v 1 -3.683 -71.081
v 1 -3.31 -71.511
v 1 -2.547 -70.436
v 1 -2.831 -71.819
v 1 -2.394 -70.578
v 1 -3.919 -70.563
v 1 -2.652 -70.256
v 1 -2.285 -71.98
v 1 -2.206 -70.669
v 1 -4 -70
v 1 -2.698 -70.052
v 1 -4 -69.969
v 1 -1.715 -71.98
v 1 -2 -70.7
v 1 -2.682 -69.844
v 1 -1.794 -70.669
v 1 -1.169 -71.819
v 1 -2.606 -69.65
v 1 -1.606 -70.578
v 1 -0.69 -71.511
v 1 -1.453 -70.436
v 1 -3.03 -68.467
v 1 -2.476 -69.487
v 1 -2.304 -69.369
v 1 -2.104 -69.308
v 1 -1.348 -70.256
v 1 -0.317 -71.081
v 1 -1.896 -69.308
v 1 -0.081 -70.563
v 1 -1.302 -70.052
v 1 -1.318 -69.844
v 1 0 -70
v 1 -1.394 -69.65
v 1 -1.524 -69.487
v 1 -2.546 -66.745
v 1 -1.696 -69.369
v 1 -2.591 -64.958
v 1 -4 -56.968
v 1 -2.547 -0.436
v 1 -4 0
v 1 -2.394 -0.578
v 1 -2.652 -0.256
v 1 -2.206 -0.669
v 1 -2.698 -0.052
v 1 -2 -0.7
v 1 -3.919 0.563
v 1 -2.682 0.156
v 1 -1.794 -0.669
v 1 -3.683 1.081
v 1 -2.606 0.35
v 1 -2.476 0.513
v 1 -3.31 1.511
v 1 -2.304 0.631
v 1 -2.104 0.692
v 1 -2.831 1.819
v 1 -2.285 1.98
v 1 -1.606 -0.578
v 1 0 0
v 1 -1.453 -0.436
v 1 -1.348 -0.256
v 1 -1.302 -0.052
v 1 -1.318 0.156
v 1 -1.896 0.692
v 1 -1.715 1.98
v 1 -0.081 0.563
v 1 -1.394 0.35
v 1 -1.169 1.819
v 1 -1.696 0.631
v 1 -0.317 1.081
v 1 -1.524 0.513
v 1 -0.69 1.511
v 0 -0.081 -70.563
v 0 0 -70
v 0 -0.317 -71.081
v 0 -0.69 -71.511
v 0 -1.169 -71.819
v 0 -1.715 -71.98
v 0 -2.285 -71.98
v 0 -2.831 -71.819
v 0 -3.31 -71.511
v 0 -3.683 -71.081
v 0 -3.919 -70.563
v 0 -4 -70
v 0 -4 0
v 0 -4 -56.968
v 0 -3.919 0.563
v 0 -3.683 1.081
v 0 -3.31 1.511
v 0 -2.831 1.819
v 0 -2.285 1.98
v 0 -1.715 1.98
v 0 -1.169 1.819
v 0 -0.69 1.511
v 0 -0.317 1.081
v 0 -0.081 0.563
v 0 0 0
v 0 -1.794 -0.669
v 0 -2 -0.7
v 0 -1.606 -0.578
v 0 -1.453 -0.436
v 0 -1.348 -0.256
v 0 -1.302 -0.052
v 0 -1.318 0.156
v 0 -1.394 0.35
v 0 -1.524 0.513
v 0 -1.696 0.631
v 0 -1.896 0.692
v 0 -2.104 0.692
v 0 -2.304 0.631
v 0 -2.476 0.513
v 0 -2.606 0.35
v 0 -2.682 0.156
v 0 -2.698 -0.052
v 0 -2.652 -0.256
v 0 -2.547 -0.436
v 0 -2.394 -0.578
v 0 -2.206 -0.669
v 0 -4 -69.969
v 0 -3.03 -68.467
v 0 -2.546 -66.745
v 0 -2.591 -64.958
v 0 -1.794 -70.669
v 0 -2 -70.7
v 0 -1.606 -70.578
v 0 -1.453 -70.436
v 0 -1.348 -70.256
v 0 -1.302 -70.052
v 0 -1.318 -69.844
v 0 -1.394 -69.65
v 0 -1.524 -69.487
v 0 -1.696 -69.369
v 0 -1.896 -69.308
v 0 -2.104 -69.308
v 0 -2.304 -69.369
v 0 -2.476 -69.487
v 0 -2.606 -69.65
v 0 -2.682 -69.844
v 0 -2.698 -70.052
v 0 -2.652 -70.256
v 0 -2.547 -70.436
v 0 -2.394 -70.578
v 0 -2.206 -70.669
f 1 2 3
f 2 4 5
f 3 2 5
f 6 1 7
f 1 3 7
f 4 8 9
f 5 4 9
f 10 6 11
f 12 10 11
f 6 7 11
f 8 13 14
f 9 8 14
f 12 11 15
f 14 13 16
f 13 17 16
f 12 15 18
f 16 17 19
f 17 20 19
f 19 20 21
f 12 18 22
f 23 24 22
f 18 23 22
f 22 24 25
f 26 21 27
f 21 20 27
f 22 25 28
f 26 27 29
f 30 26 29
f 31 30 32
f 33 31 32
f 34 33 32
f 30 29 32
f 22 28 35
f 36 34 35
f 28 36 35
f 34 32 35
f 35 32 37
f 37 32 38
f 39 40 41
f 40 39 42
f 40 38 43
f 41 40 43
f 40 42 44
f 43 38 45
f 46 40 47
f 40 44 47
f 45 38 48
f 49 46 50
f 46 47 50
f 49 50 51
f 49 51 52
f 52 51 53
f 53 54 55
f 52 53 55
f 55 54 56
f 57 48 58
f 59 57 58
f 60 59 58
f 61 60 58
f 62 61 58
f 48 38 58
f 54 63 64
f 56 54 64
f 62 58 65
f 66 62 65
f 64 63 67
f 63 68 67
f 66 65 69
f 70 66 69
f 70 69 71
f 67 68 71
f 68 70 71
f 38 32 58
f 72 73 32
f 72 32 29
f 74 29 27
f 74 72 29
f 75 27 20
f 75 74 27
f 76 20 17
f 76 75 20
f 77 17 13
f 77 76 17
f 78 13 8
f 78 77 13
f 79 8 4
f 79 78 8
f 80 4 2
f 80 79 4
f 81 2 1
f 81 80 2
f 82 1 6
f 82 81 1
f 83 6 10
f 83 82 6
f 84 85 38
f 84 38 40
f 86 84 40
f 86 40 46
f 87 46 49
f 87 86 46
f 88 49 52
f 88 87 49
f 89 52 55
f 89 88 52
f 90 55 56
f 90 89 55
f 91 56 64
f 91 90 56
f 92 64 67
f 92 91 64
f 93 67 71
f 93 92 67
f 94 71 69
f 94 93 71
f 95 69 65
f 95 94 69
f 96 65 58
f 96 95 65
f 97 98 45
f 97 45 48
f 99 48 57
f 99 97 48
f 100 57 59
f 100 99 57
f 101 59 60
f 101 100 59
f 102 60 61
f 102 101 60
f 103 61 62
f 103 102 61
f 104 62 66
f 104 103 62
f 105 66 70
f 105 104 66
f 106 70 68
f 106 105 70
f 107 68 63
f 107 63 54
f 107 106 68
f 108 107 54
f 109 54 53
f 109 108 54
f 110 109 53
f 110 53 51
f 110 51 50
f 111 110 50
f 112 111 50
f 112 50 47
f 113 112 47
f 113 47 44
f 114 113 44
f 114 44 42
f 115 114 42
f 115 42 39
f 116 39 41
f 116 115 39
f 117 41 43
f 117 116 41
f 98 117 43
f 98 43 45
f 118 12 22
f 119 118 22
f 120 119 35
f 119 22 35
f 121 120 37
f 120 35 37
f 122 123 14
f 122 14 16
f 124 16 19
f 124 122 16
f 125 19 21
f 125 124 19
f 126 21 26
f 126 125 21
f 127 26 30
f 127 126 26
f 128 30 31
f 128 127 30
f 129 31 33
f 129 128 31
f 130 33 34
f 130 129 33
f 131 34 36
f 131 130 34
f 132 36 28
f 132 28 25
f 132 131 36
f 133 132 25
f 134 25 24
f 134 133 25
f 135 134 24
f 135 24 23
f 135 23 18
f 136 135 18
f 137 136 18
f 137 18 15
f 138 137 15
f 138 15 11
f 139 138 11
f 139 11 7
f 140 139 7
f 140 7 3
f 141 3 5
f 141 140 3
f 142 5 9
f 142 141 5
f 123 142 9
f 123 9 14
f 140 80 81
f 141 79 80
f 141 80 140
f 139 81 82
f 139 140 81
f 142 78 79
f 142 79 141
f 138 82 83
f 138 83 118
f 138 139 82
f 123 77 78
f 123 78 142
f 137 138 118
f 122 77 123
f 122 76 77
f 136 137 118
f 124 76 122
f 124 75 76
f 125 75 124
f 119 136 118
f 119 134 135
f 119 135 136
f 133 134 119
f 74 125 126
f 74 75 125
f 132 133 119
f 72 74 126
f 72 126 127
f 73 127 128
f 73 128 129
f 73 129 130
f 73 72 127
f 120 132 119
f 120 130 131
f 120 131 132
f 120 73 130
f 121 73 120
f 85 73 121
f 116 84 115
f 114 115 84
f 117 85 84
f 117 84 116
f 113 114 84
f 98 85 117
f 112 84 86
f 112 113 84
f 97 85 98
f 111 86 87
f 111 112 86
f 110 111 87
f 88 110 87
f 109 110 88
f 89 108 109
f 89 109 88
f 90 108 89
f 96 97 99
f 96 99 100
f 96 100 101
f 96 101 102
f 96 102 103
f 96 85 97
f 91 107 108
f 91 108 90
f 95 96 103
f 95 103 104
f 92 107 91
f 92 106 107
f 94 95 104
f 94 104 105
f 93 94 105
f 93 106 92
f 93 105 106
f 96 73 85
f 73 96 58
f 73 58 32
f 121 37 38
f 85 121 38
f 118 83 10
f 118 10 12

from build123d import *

# Parameters (mm, degrees)
SKETCH_1_R          = 0.7
EXTRUDE_1_DEPTH     = 1
CUT_EXTRUDE_1_DEPTH = 2


with BuildPart() as part:
    # Эскиз1 → Вытянуть1 (new body)
    with BuildSketch(Plane(origin=(0, 0, 0), x_dir=(0, 0, -1), z_dir=(1, 0, 0))):
        with BuildLine():
            Line((0, 0), (70, 0))
            ThreePointArc((70, 0), (72, -2), (70, -4))
            Line((70, -4), (0, -4))
            ThreePointArc((0, -4), (-2, -2), (0, 0))
        make_face()
        with Locations((0, -2)):
            Circle(SKETCH_1_R, mode=Mode.SUBTRACT)
        with Locations((70, -2)):
            Circle(SKETCH_1_R, mode=Mode.SUBTRACT)
    extrude(amount=EXTRUDE_1_DEPTH)

    # Эскиз2 → Вырез-Вытянуть1 (cut, through all)
    with BuildSketch(Plane(origin=(1, 0, 0), x_dir=(0, 0, -1), z_dir=(1, 0, 0))):
        with BuildLine():
            Line((185.588178167, -105.966859724), (69.968626967, -4))
            ThreePointArc((69.968626967, -4), (67.624087686, -2.723985874), (64.958110934, -2.591153482))
            Line((64.958110934, -2.591153482), (56.968145289, -4))
            Line((56.968145289, -4), (-94.849228607, -30.769499158))
            Line((-94.849228607, -30.769499158), (-174.701887648, -328.568151357))
            Line((-174.701887648, -328.568151357), (105.735519126, -403.765511923))
            Line((105.735519126, -403.765511923), (185.588178167, -105.966859724))
        make_face()
    extrude(amount=-CUT_EXTRUDE_1_DEPTH, mode=Mode.SUBTRACT)


solid = part.part
